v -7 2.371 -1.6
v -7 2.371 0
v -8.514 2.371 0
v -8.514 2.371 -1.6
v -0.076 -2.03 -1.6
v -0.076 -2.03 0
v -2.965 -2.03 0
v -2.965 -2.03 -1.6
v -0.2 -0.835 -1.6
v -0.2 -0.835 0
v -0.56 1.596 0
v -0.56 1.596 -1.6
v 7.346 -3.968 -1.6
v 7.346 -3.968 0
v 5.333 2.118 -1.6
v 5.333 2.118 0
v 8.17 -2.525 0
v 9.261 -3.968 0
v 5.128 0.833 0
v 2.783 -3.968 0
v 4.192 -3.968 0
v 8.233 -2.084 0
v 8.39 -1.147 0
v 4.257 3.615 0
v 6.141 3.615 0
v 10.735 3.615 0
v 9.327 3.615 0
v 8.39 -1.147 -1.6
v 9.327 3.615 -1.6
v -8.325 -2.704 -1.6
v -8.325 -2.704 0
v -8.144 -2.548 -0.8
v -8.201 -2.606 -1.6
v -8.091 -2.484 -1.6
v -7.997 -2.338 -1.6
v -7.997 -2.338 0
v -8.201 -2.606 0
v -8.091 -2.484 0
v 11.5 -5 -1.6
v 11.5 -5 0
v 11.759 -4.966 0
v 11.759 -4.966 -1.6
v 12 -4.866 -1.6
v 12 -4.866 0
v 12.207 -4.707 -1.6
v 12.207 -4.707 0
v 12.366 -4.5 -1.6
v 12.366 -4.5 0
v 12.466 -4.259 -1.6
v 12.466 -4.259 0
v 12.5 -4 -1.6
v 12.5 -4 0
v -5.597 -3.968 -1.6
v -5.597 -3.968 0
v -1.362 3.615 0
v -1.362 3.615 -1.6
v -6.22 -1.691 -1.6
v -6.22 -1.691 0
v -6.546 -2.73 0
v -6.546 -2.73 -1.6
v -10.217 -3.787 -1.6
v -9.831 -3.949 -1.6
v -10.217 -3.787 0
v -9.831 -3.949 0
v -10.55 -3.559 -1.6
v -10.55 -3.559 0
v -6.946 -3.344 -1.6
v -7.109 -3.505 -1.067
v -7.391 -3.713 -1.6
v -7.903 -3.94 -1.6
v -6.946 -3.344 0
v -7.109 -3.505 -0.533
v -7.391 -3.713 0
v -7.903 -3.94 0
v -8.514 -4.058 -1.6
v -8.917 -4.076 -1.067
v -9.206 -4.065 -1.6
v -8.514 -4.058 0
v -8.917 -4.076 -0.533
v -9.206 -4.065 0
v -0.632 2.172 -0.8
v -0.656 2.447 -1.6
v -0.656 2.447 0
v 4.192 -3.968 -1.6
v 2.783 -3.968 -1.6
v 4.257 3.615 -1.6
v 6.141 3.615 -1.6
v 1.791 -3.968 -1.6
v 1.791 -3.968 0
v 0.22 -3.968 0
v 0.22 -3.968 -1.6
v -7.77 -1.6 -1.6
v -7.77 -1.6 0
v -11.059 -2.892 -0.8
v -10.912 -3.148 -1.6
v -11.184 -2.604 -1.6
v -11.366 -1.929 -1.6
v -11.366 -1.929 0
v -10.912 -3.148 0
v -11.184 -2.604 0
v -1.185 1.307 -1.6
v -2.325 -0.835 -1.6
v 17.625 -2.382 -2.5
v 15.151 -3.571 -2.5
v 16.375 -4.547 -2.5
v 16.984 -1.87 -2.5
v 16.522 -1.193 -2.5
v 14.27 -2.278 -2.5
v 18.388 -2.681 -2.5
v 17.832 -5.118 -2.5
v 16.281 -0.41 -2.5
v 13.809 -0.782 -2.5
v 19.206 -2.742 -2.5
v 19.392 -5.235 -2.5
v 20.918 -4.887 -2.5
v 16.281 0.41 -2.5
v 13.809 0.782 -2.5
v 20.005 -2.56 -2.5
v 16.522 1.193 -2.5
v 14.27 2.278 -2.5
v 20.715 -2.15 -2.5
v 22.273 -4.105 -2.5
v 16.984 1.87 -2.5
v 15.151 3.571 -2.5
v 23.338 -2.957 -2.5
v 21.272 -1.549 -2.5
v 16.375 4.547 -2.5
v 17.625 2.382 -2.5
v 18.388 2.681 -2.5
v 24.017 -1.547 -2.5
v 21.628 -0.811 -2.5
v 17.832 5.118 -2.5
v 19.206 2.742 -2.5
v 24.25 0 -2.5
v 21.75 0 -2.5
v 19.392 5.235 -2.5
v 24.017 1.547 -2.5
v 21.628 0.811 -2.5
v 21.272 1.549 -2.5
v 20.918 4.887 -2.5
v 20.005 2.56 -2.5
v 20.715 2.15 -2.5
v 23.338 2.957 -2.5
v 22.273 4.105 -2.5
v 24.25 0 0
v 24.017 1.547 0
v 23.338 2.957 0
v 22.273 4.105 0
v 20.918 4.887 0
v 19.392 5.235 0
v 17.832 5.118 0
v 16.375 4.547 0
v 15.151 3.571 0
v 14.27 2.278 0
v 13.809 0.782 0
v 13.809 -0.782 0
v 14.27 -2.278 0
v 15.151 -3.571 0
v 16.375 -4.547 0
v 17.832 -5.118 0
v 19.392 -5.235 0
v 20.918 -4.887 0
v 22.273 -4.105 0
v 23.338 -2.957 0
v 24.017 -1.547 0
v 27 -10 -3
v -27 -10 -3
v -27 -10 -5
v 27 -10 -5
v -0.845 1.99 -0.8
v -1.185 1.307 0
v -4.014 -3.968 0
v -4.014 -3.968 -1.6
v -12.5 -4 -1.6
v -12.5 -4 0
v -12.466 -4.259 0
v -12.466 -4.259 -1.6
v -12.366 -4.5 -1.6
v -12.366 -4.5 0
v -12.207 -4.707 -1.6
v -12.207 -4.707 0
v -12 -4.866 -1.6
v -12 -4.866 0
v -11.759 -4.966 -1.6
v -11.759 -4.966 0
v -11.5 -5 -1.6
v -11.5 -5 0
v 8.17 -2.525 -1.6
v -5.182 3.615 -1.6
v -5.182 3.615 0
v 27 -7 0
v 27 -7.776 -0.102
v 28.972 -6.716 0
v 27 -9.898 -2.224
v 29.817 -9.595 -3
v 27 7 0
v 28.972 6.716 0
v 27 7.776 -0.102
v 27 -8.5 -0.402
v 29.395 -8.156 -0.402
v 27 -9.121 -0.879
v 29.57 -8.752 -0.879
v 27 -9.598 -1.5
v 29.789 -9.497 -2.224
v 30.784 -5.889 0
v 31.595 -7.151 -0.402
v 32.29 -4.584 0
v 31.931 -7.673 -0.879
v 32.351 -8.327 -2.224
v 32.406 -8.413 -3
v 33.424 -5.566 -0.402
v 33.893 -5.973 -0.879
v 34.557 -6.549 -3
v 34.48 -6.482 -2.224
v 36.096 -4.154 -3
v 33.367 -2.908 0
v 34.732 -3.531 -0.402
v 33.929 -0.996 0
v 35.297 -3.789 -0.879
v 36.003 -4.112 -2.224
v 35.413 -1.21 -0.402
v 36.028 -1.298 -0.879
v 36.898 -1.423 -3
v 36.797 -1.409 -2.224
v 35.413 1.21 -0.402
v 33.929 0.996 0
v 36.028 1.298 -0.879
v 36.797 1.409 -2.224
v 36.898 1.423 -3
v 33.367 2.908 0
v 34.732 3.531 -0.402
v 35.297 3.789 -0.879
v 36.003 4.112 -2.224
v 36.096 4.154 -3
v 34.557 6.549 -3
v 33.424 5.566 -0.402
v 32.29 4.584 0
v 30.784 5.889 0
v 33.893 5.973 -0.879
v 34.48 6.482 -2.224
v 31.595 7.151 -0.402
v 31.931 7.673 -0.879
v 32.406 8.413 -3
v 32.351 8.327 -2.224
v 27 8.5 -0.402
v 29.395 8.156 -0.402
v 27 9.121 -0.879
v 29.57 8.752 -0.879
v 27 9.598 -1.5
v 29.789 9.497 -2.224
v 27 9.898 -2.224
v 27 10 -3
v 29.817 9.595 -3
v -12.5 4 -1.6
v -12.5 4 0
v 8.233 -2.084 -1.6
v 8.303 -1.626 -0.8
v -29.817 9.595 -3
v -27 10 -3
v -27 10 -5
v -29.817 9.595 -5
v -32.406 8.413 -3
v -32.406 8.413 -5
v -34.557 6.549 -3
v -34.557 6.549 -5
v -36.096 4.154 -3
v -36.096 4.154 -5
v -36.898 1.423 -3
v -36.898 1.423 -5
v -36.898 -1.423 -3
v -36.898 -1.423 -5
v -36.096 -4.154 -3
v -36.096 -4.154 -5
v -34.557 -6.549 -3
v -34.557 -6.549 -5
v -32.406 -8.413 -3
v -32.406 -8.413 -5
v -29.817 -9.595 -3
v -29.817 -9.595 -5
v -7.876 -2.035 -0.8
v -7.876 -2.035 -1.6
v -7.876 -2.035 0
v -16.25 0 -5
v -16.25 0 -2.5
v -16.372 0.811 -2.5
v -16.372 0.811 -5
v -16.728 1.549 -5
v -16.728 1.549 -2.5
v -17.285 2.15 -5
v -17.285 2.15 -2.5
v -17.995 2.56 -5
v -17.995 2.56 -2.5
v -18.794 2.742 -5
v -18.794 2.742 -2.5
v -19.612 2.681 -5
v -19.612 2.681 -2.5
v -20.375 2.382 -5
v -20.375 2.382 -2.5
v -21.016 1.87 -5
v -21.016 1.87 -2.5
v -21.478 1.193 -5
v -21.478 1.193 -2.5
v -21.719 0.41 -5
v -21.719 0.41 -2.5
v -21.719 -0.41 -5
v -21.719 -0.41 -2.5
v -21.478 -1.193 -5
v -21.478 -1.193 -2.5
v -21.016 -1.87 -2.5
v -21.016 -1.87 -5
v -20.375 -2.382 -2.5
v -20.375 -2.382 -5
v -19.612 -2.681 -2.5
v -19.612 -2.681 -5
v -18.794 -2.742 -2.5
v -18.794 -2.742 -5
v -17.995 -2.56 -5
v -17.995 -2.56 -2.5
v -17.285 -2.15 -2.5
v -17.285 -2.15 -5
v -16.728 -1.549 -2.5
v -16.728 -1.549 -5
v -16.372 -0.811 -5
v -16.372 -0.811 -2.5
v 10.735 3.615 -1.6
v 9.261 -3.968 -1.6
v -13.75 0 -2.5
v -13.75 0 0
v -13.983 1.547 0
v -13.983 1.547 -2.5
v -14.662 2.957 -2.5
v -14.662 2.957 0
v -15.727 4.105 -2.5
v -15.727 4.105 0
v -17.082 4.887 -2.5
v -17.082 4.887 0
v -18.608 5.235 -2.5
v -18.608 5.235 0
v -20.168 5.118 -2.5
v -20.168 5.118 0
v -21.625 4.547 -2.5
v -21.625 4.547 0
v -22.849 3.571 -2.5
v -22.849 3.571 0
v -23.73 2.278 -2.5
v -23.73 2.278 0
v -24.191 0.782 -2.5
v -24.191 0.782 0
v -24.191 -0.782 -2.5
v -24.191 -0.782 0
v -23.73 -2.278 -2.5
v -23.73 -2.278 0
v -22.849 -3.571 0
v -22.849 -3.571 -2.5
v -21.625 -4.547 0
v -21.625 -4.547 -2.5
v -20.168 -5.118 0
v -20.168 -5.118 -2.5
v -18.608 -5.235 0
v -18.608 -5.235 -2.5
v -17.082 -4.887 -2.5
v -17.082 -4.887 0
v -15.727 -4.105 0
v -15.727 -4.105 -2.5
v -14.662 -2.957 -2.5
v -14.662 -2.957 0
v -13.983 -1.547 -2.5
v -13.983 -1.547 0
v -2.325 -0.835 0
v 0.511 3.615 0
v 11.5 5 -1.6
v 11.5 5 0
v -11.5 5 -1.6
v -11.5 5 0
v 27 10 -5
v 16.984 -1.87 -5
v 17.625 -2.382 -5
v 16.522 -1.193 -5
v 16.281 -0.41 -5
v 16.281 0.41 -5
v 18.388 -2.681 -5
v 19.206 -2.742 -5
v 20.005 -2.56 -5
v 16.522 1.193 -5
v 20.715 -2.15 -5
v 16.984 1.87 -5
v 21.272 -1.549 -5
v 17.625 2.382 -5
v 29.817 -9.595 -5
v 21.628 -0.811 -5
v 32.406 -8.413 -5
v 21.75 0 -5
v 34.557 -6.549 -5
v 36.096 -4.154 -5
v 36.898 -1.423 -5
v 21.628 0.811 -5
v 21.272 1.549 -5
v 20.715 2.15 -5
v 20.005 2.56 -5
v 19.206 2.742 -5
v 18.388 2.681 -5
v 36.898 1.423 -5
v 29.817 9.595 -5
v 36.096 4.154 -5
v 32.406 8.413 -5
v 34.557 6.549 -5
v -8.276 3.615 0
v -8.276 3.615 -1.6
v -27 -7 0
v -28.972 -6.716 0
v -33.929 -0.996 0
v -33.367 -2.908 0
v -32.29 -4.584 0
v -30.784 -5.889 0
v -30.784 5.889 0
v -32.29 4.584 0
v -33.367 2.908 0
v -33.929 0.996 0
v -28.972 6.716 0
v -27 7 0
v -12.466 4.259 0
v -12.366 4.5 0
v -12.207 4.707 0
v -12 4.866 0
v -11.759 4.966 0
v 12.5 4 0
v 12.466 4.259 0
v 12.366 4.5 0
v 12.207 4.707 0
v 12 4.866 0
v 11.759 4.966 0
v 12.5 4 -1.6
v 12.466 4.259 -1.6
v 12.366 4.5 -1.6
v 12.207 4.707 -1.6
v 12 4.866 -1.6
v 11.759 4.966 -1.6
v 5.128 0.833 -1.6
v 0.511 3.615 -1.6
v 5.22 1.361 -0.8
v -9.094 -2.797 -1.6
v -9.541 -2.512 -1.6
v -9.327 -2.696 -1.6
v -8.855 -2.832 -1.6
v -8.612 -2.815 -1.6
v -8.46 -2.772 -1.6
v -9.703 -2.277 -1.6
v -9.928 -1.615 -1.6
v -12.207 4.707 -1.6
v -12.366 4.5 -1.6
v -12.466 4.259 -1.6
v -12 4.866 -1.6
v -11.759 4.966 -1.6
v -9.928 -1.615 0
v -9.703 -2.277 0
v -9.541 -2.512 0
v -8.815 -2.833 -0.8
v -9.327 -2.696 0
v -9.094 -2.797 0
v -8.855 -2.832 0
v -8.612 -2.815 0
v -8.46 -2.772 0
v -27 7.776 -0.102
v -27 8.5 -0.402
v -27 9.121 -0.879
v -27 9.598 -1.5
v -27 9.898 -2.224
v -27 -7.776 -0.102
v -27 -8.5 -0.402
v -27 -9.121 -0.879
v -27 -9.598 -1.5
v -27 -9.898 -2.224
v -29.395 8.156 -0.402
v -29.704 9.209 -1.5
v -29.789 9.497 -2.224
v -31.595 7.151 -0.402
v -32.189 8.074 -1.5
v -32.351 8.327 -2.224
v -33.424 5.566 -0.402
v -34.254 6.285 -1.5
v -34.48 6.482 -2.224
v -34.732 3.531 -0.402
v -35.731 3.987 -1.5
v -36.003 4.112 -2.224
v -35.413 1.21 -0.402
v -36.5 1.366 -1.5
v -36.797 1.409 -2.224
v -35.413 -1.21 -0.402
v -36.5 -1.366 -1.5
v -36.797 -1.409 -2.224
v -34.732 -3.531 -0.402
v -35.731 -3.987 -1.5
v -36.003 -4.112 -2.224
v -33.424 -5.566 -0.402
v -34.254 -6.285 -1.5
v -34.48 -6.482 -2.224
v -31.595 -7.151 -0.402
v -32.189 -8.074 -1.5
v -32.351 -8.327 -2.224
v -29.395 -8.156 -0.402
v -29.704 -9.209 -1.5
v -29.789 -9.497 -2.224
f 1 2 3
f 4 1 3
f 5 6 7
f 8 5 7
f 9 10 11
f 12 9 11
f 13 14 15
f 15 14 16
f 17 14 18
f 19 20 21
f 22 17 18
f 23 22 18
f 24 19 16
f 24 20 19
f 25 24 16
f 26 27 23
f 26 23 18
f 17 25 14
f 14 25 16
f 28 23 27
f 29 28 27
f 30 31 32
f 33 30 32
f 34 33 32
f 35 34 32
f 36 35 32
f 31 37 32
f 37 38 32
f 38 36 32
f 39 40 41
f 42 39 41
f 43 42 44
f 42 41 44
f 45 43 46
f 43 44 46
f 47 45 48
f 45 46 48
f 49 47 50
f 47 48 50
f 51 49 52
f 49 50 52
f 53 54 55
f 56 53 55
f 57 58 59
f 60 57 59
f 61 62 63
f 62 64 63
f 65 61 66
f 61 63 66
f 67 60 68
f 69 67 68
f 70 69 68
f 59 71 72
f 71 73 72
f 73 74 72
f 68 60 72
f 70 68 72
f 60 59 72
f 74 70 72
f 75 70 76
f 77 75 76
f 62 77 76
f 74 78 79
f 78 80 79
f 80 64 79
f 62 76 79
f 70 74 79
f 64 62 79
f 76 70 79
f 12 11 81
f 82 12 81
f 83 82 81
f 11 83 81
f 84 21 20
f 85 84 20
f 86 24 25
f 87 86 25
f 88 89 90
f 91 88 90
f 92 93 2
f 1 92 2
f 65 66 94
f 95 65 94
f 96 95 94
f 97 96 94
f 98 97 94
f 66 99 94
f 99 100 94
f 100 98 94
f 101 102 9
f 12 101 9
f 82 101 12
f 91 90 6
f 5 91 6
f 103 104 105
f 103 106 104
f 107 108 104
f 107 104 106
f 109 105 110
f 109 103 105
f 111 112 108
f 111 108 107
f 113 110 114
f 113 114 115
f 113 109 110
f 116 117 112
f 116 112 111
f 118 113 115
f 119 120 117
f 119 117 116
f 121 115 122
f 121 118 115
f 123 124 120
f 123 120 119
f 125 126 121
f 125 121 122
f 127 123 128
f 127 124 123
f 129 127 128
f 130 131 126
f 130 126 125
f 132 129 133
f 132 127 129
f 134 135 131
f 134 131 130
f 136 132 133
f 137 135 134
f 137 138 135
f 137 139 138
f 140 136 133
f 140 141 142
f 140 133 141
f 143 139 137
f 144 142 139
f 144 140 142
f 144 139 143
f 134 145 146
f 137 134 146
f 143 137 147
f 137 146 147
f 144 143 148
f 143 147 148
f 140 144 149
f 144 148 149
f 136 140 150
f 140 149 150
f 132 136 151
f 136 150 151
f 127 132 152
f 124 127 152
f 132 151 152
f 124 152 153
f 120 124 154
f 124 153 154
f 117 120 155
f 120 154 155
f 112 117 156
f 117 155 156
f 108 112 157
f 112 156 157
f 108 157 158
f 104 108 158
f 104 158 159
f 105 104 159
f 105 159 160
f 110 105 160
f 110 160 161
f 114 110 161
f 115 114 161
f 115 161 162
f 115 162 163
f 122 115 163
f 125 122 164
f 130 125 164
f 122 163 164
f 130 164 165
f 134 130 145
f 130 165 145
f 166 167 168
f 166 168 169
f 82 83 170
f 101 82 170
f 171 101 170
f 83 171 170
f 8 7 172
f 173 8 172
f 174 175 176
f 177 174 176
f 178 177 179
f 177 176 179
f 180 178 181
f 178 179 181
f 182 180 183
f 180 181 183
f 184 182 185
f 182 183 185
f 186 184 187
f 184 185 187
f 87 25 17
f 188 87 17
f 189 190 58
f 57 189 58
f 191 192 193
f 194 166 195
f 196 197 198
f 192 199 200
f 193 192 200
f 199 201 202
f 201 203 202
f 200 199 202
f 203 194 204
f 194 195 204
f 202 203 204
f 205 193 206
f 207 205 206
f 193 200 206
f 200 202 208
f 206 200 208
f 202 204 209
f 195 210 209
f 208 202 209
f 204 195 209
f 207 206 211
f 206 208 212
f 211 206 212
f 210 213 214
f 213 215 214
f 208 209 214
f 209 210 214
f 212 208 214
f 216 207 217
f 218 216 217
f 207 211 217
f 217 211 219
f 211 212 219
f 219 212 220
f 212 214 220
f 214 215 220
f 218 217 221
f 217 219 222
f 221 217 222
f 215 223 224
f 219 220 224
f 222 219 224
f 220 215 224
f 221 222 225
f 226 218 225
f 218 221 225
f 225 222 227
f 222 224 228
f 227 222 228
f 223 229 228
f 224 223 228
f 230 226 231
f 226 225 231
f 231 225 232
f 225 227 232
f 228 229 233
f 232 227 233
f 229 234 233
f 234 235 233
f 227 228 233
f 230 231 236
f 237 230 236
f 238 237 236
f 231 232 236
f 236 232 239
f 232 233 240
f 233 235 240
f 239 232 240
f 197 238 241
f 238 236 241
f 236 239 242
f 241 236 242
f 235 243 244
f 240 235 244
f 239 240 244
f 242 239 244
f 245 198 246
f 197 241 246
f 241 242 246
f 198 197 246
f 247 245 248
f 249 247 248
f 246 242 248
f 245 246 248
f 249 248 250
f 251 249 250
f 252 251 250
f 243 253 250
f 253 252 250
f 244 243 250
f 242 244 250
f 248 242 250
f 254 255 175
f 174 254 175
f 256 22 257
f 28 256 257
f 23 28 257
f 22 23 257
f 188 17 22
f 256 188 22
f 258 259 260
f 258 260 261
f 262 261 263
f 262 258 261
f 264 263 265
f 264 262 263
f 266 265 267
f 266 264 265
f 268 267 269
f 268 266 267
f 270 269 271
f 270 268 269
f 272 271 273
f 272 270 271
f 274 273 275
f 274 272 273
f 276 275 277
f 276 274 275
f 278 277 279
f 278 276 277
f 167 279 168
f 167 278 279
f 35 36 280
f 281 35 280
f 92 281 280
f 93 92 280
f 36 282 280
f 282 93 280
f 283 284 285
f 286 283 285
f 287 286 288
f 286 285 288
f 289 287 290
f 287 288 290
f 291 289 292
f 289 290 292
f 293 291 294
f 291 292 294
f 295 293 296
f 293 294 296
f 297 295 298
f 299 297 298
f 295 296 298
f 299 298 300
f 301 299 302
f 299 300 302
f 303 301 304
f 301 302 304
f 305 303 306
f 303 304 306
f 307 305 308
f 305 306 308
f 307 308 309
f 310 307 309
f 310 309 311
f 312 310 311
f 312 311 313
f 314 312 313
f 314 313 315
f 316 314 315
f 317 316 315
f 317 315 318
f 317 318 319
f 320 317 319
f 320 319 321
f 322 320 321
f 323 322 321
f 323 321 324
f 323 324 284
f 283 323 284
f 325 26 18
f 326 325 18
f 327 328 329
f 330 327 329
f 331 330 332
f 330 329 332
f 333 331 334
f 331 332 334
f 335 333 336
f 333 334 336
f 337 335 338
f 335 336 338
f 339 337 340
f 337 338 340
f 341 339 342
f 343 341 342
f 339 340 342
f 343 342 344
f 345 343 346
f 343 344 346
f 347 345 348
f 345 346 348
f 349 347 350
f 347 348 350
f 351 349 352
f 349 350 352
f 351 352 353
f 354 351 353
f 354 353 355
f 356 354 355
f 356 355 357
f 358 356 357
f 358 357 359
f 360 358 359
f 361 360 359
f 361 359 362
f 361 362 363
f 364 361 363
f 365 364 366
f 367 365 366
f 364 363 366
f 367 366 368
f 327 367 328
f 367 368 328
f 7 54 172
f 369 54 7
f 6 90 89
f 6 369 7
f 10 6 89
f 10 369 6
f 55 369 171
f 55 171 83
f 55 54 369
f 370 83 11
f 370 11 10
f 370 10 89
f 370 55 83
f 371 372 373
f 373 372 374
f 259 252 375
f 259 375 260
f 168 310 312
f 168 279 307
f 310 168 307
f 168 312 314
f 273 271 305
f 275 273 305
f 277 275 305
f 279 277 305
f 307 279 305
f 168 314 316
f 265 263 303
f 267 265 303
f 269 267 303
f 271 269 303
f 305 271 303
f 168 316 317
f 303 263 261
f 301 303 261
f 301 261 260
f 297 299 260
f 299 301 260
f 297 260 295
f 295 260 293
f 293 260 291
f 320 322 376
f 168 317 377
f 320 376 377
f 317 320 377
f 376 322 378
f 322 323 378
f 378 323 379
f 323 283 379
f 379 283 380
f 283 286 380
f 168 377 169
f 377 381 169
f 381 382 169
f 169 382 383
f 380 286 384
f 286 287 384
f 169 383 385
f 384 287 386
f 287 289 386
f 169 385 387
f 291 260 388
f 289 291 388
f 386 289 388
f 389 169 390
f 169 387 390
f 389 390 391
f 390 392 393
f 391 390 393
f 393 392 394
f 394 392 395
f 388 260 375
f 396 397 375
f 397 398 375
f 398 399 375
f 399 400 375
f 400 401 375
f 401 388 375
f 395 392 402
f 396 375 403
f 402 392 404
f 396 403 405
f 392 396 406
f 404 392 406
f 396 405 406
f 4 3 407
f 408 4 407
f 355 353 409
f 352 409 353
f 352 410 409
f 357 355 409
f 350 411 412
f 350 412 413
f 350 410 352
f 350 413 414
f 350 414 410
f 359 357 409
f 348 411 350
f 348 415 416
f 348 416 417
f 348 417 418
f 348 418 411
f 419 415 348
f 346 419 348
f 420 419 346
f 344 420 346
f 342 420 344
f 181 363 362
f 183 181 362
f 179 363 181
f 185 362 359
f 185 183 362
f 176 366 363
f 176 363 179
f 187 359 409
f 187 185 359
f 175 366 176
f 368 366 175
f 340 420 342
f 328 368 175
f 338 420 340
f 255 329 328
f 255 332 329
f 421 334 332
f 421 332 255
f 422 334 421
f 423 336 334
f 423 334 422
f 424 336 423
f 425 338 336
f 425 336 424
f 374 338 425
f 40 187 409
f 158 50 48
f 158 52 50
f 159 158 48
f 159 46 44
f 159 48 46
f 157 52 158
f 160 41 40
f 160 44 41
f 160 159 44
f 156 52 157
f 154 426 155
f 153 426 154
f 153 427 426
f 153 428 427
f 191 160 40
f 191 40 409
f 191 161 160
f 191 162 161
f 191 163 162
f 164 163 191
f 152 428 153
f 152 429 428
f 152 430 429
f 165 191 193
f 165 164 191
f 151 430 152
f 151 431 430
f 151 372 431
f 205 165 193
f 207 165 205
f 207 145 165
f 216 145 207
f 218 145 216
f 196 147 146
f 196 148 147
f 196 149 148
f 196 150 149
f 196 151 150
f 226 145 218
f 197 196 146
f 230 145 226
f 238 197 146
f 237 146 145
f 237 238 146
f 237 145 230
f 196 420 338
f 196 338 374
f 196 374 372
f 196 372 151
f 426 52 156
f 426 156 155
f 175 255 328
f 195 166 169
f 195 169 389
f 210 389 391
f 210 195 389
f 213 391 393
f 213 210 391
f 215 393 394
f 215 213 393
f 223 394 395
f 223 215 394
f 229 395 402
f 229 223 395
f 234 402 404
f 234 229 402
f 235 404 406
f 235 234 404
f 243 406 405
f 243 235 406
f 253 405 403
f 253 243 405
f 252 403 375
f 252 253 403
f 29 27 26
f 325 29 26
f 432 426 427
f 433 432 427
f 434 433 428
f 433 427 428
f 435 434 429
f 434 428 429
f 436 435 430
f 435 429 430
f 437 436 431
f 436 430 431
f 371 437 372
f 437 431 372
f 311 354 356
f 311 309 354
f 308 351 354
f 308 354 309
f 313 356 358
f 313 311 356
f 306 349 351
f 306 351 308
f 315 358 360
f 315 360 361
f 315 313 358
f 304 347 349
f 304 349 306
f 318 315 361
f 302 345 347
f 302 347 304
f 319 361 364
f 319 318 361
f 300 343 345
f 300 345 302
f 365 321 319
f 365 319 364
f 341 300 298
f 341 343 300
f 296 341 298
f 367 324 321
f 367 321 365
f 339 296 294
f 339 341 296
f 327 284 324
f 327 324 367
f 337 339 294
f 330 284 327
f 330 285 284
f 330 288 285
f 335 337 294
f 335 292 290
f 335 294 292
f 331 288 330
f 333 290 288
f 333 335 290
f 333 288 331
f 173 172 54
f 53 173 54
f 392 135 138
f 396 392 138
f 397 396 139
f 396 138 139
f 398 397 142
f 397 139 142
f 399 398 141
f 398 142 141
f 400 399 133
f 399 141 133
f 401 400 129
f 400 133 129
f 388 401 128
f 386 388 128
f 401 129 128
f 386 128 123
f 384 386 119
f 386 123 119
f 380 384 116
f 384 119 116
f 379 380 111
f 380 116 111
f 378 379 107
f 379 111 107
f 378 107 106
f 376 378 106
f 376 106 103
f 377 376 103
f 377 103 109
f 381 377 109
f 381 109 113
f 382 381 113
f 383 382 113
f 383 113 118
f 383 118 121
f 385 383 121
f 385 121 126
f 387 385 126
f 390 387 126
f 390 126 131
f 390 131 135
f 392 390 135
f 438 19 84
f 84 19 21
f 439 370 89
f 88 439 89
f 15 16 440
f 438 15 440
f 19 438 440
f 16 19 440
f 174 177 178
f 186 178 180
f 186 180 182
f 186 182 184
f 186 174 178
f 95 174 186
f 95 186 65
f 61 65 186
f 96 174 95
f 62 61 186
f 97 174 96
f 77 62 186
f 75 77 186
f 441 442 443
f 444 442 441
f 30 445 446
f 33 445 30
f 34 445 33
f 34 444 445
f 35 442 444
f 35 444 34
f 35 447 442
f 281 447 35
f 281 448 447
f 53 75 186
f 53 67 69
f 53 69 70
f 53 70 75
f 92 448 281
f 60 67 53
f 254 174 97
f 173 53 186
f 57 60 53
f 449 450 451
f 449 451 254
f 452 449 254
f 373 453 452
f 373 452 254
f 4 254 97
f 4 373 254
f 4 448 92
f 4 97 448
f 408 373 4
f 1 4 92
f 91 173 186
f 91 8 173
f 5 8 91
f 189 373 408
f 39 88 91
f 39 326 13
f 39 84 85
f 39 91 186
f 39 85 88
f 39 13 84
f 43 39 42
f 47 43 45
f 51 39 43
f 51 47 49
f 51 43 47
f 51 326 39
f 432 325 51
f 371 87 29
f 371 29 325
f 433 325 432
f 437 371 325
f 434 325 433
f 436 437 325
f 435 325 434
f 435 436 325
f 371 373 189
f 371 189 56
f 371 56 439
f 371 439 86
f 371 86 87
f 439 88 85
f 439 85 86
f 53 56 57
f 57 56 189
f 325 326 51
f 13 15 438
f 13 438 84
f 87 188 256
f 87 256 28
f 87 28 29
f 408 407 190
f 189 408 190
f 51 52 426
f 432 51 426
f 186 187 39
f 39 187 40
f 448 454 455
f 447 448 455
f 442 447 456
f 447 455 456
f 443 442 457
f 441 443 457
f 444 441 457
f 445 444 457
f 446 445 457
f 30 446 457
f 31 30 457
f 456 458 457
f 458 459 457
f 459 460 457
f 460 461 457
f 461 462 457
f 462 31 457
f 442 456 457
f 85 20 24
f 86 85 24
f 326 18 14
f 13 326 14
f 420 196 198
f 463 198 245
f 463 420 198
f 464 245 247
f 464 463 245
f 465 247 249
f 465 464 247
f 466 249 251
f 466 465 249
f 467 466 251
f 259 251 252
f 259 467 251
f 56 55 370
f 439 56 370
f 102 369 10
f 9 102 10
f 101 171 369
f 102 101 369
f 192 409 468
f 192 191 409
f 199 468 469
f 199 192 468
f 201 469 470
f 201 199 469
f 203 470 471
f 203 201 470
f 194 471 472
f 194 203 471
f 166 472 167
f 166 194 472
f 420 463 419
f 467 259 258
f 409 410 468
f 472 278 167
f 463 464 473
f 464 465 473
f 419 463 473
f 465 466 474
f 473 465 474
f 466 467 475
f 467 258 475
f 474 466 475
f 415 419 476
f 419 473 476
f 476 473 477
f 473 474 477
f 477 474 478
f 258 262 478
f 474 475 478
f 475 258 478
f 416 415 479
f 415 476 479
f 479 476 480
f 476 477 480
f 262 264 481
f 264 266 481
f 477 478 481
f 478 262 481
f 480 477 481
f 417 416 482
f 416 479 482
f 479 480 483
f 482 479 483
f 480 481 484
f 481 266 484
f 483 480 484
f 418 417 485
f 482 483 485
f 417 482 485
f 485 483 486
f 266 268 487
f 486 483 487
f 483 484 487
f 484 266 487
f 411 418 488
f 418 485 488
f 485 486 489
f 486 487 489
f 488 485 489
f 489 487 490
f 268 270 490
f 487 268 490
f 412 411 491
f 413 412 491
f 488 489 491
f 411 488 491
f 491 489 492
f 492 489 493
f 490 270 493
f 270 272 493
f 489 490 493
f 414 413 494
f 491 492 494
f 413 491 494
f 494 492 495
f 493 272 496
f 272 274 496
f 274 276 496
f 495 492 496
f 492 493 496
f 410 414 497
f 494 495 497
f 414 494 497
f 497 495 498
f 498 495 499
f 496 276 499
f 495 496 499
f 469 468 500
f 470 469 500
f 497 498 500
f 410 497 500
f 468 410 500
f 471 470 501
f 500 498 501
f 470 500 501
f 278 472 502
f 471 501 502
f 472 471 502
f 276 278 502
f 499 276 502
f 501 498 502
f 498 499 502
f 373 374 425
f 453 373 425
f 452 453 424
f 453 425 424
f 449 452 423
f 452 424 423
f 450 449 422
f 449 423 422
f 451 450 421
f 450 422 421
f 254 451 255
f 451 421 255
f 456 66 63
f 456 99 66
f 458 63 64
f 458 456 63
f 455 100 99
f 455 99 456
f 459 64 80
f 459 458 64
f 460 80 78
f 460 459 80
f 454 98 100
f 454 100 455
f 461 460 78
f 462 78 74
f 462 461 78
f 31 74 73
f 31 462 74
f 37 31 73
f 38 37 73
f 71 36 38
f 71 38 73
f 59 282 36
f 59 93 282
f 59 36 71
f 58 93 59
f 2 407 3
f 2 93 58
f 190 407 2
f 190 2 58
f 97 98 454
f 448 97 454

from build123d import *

# Parameters (mm, degrees)
F0_R     = 5.25
F0_R_2   = 2.75
F1_DEPTH = 5
F2_DEPTH = 2.5
F4_R     = 3
F6_DEPTH = 1.6


with BuildPart() as f1:
    # F0 (on Top) → F1 (new body)
    with BuildSketch(Plane.XY):
        with BuildLine():
            Line((27, 10), (-27, 10))
            ThreePointArc((-27, 10), (-37, 0), (-27, -10))
            Line((-27, -10), (27, -10))
            ThreePointArc((27, -10), (37, 0), (27, 10))
        make_face()
        with Locations((-19, 0)):
            Circle(F0_R, mode=Mode.SUBTRACT)
        with Locations((19, 0)):
            Circle(F0_R, mode=Mode.SUBTRACT)
        with Locations((-19, 0)):
            Circle(F0_R)
        with Locations((-19, 0)):
            Circle(F0_R_2, mode=Mode.SUBTRACT)
        with Locations((19, 0)):
            Circle(F0_R)
        with Locations((19, 0)):
            Circle(F0_R_2, mode=Mode.SUBTRACT)
    extrude(amount=-F1_DEPTH)

    # F0 (on Top) → F2 (cut)
    with BuildSketch(Plane.XY):
        with Locations((-19, 0)):
            Circle(F0_R)
        with Locations((-19, 0)):
            Circle(F0_R_2, mode=Mode.SUBTRACT)
        with Locations((19, 0)):
            Circle(F0_R)
        with Locations((19, 0)):
            Circle(F0_R_2, mode=Mode.SUBTRACT)
    extrude(amount=-F2_DEPTH, mode=Mode.SUBTRACT)

    # F4
    f4_edges = [f1.edges().sort_by_distance(p)[0] for p in [
        (0, -10, 0),
        (0, 10, 0),
    ]]
    fillet(f4_edges, radius=F4_R)

    # F5 (on face) → F6 (cut)
    with BuildSketch(Plane.XY):
        with BuildLine():
            Line((11.5, 5), (-11.5, 5))
            ThreePointArc((-11.5, 5), (-12.2071067812, 4.7071067812), (-12.5, 4))
            Line((-12.5, 4), (-12.5, -4))
            ThreePointArc((-12.5, -4), (-12.2071067812, -4.7071067812), (-11.5, -5))
            Line((-11.5, -5), (11.5, -5))
            ThreePointArc((11.5, -5), (12.2071067812, -4.7071067812), (12.5, -4))
            Line((12.5, -4), (12.5, 4))
            ThreePointArc((12.5, 4), (12.2071067812, 4.7071067812), (11.5, 5))
        make_face()
        with BuildLine():
            add(Edge.make_bspline(
                [(-7.1087151842, -3.5052785265), (-7.754492363, -4.0761455526), (-8.9168912848, -4.0761455526)],
                knots=[0, 0, 0, 1, 1, 1], degree=2))
            add(Edge.make_bspline(
                [(-8.9168912848, -4.0761455526), (-9.939802336, -4.0761455526), (-10.5502770291, -3.5586627733)],
                knots=[0, 0, 0, 1, 1, 1], degree=2))
            add(Edge.make_bspline(
                [(-10.5502770291, -3.5586627733), (-11.1607517221, -3.041179994), (-11.3656783468, -1.928721174)],
                knots=[0, 0, 0, 1, 1, 1], degree=2))
            Line((-11.3656783468, -1.928721174), (-9.9277478287, -1.6153039832))
            add(Edge.make_bspline(
                [(-9.9277478287, -1.6153039832), (-9.6814914645, -2.8328092243), (-8.8152890087, -2.8328092243)],
                knots=[0, 0, 0, 1, 1, 1], degree=2))
            add(Edge.make_bspline(
                [(-8.8152890087, -2.8328092243), (-8.5242587601, -2.8328092243), (-8.325359389, -2.7036537886)],
                knots=[0, 0, 0, 1, 1, 1], degree=2))
            add(Edge.make_bspline(
                [(-8.325359389, -2.7036537886), (-8.126460018, -2.5744983528), (-7.9973045822, -2.3377133872)],
                knots=[0, 0, 0, 1, 1, 1], degree=2))
            add(Edge.make_bspline(
                [(-7.9973045822, -2.3377133872), (-7.8681491465, -2.1009284217), (-7.7699910153, -1.5998053309)],
                knots=[0, 0, 0, 1, 1, 1], degree=2))
            Line((-7.7699910153, -1.5998053309), (-7.0002246181, 2.3712938005))
            Line((-7.0002246181, 2.3712938005), (-8.5139263252, 2.3712938005))
            Line((-8.5139263252, 2.3712938005), (-8.2762803235, 3.6146301288))
            Line((-8.2762803235, 3.6146301288), (-5.1817160827, 3.6146301288))
            Line((-5.1817160827, 3.6146301288), (-6.2201257862, -1.6910751722))
            add(Edge.make_bspline(
                [(-6.2201257862, -1.6910751722), (-6.4629380054, -2.9344115004), (-7.1087151842, -3.5052785265)],
                knots=[0, 0, 0, 1, 1, 1], degree=2))
        make_face(mode=Mode.SUBTRACT)
        Polygon((1.7909553759, -3.9676549865), (0.220425277, -3.9676549865), (-0.075771189, -2.0303234501), (-2.965408805, -2.0303234501), (-4.0141509434, -3.9676549865), (-5.5967355496, -3.9676549865), (-1.3621593291, 3.6146301288), (0.5114555256, 3.6146301288), align=None, mode=Mode.SUBTRACT)
        with BuildLine():
            Line((9.2613057802, -3.9676549865), (7.346361186, -3.9676549865))
            Line((7.346361186, -3.9676549865), (5.3332584606, 2.1181491465))
            add(Edge.make_bspline(
                [(5.3332584606, 2.1181491465), (5.2092692423, 1.2467804732), (5.1283318359, 0.8334830788)],
                knots=[0, 0, 0, 1, 1, 1], degree=2))
            Line((5.1283318359, 0.8334830788), (4.1915244085, -3.9676549865))
            Line((4.1915244085, -3.9676549865), (2.7828691225, -3.9676549865))
            Line((2.7828691225, -3.9676549865), (4.2569631626, 3.6146301288))
            Line((4.2569631626, 3.6146301288), (6.1409104522, 3.6146301288))
            Line((6.1409104522, 3.6146301288), (8.1695118299, -2.524558251))
            Line((8.1695118299, -2.524558251), (8.2332285115, -2.0837076969))
            add(Edge.make_bspline(
                [(8.2332285115, -2.0837076969), (8.2935010482, -1.6376909254), (8.3899371069, -1.1469002695)],
                knots=[0, 0, 0, 1, 1, 1], degree=2))
            Line((8.3899371069, -1.1469002695), (9.3267445343, 3.6146301288))
            Line((9.3267445343, 3.6146301288), (10.7353998203, 3.6146301288))
            Line((10.7353998203, 3.6146301288), (9.2613057802, -3.9676549865))
        make_face(mode=Mode.SUBTRACT)
        with BuildLine():
            add(Edge.make_bspline(
                [(-0.559673555, 1.596361186), (-0.6561096137, 2.3230757712), (-0.6561096137, 2.4470649895)],
                knots=[0, 0, 0, 1, 1, 1], degree=2))
            add(Edge.make_bspline(
                [(-0.6561096137, 2.4470649895), (-0.7697663971, 2.1026504942), (-1.184785864, 1.3070530099)],
                knots=[0, 0, 0, 1, 1, 1], degree=2))
            Line((-1.184785864, 1.3070530099), (-2.3247978437, -0.8352051512))
            Line((-2.3247978437, -0.8352051512), (-0.1997604073, -0.8352051512))
            Line((-0.1997604073, -0.8352051512), (-0.559673555, 1.596361186))
        make_face()
    extrude(amount=-F6_DEPTH, mode=Mode.SUBTRACT)


solid = f1.part
